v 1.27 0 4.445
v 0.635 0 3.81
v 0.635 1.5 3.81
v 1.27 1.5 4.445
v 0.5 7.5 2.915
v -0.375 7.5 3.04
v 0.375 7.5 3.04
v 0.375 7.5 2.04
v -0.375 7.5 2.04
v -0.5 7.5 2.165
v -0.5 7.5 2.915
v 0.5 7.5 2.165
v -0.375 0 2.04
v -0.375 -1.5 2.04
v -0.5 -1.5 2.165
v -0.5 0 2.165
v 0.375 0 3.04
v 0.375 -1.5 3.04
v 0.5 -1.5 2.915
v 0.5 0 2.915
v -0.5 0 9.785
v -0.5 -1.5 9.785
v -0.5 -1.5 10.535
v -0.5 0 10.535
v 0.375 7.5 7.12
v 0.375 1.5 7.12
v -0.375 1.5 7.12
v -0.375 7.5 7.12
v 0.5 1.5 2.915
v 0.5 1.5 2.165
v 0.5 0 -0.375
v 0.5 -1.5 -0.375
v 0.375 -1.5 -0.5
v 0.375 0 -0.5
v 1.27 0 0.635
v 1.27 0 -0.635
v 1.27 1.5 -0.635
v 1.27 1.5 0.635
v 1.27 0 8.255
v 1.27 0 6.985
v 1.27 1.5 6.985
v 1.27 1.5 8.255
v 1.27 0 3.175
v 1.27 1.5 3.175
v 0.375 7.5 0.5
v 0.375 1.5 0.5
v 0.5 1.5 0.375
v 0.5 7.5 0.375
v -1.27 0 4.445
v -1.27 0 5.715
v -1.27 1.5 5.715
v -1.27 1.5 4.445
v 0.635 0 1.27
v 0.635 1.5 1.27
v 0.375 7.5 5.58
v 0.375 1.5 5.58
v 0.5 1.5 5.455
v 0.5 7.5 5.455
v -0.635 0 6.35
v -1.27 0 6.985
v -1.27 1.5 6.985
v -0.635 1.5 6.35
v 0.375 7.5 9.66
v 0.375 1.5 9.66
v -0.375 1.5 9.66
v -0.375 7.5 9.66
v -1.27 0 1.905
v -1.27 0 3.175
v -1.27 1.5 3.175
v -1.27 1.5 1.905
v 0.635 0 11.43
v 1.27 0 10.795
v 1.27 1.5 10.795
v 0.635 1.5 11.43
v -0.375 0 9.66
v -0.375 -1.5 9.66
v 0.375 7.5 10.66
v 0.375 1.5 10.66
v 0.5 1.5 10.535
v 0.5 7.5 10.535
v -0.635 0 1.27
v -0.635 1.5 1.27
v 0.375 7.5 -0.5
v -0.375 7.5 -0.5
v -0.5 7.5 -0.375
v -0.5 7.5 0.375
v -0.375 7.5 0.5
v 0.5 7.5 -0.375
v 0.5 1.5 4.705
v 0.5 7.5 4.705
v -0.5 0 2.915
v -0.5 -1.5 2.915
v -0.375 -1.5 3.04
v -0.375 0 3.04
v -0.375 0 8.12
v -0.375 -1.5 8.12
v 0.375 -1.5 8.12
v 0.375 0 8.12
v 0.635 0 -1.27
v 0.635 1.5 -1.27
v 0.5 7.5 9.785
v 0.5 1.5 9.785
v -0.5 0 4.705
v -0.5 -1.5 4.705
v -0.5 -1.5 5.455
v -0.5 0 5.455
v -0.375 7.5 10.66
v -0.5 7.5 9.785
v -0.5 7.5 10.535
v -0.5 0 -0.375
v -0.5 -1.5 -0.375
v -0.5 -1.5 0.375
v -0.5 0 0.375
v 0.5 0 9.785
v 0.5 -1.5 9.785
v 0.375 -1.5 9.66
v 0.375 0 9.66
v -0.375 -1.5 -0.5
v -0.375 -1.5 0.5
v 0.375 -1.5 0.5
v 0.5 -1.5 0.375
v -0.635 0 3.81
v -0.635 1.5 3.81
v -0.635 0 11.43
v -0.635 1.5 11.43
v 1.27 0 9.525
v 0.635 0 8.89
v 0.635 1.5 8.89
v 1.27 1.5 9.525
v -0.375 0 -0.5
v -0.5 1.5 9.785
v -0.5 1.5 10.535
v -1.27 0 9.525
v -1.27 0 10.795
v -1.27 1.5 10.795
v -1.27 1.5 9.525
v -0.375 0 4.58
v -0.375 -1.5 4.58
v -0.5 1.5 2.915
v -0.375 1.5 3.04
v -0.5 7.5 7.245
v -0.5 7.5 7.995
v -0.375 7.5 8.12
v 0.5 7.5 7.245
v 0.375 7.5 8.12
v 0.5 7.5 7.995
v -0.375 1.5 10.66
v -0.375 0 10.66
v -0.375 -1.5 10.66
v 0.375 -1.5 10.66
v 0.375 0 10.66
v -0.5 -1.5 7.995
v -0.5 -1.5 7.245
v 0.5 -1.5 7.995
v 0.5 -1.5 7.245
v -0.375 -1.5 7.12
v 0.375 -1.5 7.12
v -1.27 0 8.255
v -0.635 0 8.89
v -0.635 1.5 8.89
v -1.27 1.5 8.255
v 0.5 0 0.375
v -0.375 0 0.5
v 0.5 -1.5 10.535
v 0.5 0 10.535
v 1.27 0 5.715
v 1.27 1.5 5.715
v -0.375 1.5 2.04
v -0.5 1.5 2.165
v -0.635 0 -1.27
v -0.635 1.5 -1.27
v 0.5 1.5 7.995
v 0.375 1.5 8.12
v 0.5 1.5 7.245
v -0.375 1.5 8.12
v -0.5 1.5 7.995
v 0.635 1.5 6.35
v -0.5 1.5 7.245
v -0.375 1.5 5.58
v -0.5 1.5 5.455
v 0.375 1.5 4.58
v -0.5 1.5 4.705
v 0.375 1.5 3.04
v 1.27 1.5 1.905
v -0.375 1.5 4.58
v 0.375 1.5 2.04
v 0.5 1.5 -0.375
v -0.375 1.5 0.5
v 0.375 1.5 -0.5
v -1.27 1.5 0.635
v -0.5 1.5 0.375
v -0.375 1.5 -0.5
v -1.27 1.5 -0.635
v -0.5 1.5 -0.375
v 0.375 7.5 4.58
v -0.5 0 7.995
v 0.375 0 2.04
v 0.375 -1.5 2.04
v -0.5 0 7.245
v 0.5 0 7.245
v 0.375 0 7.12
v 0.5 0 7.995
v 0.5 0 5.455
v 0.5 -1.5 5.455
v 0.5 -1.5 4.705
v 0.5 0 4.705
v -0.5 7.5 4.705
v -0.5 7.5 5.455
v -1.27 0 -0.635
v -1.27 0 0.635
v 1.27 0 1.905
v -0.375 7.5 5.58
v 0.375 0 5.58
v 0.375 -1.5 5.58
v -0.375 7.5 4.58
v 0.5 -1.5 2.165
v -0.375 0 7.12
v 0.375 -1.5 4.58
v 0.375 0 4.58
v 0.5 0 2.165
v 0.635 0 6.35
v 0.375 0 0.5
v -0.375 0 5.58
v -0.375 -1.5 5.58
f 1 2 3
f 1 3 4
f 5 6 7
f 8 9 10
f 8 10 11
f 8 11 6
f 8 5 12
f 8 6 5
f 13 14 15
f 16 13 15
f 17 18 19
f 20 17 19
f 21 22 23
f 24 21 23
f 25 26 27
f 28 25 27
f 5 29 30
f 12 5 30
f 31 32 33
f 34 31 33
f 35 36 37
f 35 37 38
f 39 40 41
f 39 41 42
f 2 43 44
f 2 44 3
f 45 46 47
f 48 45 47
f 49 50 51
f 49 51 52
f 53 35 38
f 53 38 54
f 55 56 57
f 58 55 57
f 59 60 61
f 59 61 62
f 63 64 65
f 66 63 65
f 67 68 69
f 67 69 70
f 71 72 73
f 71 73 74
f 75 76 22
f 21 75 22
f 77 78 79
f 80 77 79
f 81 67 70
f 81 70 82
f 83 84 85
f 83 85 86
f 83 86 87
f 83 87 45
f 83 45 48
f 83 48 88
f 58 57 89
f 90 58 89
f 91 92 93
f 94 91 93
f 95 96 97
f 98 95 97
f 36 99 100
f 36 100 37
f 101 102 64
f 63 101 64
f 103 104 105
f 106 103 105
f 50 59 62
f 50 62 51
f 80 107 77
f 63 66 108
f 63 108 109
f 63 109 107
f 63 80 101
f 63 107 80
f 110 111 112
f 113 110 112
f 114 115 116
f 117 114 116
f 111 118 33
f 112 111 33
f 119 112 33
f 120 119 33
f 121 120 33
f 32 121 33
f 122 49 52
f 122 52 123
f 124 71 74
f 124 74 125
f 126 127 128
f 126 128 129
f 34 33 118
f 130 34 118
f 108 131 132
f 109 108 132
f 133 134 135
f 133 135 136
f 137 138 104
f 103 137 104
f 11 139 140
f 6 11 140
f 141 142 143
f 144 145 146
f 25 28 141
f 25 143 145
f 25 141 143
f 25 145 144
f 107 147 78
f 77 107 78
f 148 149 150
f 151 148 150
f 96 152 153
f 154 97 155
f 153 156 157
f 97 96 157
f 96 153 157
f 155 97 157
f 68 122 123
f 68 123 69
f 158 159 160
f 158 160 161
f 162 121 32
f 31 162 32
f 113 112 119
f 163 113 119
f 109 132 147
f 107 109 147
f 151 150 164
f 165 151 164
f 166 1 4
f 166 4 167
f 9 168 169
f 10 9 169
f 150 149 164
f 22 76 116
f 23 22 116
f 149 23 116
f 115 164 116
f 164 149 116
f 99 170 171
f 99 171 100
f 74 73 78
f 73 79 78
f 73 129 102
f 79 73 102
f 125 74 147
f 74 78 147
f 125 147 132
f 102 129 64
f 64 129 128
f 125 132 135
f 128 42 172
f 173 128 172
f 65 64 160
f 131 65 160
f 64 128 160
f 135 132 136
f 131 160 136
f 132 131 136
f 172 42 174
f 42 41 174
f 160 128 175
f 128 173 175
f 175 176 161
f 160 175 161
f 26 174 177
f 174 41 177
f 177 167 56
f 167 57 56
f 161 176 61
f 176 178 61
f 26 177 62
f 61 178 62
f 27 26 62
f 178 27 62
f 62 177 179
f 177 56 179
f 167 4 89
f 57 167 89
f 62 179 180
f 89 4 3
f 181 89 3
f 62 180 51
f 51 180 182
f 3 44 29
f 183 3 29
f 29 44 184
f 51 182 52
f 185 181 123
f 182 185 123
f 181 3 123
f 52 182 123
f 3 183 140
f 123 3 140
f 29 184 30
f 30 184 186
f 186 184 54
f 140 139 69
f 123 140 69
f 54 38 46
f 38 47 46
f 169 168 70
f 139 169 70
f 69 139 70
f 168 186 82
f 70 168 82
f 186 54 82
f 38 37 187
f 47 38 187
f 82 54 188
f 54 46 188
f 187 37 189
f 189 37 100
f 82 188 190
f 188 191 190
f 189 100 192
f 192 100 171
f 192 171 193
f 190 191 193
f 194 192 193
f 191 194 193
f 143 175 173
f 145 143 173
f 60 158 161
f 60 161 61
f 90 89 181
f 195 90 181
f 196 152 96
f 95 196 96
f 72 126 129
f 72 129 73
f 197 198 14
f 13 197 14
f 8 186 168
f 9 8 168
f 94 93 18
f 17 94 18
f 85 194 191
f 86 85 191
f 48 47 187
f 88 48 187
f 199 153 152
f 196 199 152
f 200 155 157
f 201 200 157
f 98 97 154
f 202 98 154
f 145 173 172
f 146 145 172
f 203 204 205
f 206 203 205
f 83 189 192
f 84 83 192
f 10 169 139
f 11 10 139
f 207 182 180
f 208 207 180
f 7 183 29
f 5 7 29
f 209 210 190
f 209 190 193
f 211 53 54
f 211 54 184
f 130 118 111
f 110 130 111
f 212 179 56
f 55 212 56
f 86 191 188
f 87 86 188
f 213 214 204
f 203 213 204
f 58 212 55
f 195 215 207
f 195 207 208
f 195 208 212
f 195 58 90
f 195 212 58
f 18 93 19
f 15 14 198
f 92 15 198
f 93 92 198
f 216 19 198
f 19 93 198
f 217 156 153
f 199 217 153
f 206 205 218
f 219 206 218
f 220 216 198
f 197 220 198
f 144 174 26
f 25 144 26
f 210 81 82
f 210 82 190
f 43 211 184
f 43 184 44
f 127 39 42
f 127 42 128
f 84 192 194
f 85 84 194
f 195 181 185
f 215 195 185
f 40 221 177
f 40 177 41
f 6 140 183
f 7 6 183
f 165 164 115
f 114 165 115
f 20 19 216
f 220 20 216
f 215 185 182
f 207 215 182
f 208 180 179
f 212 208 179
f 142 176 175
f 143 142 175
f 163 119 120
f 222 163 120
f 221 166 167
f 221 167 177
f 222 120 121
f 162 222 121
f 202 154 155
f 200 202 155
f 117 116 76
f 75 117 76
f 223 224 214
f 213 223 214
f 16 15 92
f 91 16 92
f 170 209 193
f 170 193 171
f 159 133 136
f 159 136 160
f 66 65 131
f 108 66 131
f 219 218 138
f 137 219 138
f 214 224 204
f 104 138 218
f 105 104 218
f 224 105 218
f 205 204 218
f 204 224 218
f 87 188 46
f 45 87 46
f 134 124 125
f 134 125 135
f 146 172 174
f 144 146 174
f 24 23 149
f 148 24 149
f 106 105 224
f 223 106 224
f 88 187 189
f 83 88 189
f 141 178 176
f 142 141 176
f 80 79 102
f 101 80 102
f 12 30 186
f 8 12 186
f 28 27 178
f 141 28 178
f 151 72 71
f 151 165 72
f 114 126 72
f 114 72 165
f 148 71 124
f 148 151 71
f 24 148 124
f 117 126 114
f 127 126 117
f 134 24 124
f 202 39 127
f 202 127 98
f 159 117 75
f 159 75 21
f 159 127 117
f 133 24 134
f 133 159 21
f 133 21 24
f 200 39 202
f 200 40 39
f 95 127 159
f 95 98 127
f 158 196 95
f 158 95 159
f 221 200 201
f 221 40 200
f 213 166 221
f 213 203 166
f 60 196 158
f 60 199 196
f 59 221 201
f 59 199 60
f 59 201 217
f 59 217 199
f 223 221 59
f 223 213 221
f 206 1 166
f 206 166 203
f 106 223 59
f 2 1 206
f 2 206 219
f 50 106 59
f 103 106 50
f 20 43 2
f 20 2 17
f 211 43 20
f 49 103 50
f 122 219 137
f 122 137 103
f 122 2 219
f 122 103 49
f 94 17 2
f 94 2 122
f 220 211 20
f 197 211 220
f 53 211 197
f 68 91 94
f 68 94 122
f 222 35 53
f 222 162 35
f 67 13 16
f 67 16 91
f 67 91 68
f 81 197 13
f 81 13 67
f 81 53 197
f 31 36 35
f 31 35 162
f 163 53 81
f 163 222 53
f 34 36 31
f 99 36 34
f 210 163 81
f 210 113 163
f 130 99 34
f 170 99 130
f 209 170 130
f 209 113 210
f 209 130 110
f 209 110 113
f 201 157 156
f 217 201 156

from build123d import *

# Parameters (mm, degrees)
BOSS_EXTRUDE1_DEPTH      = 1.5
BOSS_EXTRUDE2_DEPTH      = 6
BOSS_EXTRUDE2_DEPTH_BACK = 3


with BuildPart() as part:
    # Sketch1 → Boss-Extrude1 (new body)
    with BuildSketch(Plane(origin=(0, 0, 0), x_dir=(1, 0, 0), z_dir=(0, 1, 0))):
        Polygon((-0.635, 1.27), (0.635, 1.27), (1.27, 0.635), (1.27, -0.635), (0.635, -1.27), (1.27, -1.905), (1.27, -3.175), (0.635, -3.81), (1.27, -4.445), (1.27, -5.715), (0.635, -6.35), (1.27, -6.985), (1.27, -8.255), (0.635, -8.89), (1.27, -9.525), (1.27, -10.795), (0.635, -11.43), (-0.635, -11.43), (-1.27, -10.795), (-1.27, -9.525), (-0.635, -8.89), (-1.27, -8.255), (-1.27, -6.985), (-0.635, -6.35), (-1.27, -5.715), (-1.27, -4.445), (-0.635, -3.81), (-1.27, -3.175), (-1.27, -1.905), (-0.635, -1.27), (-1.27, -0.635), (-1.27, 0.635), align=None)
    extrude(amount=BOSS_EXTRUDE1_DEPTH)

    # Sketch2 → Boss-Extrude2 (add, two sides: drawn at the far end of the back side and taken through both)
    with BuildSketch(Plane(origin=(0, 1.5, 0), x_dir=(1, 0, 0), z_dir=(0, 1, 0)).offset(-BOSS_EXTRUDE2_DEPTH_BACK)):
        Polygon((0.5, 0.375), (0.375, 0.5), (-0.375, 0.5), (-0.5, 0.375), (-0.5, -0.375), (-0.375, -0.5), (0.375, -0.5), (0.5, -0.375), align=None)
        Polygon((0.5, -2.165), (0.375, -2.04), (-0.375, -2.04), (-0.5, -2.165), (-0.5, -2.915), (-0.375, -3.04), (0.375, -3.04), (0.5, -2.915), align=None)
        Polygon((0.5, -4.705), (0.375, -4.58), (-0.375, -4.58), (-0.5, -4.705), (-0.5, -5.455), (-0.375, -5.58), (0.375, -5.58), (0.5, -5.455), align=None)
        Polygon((0.5, -7.245), (0.375, -7.12), (-0.375, -7.12), (-0.5, -7.245), (-0.5, -7.995), (-0.375, -8.12), (0.375, -8.12), (0.5, -7.995), align=None)
        Polygon((0.5, -9.785), (0.375, -9.66), (-0.375, -9.66), (-0.5, -9.785), (-0.5, -10.535), (-0.375, -10.66), (0.375, -10.66), (0.5, -10.535), align=None)
    extrude(amount=BOSS_EXTRUDE2_DEPTH + BOSS_EXTRUDE2_DEPTH_BACK)


solid = part.part
